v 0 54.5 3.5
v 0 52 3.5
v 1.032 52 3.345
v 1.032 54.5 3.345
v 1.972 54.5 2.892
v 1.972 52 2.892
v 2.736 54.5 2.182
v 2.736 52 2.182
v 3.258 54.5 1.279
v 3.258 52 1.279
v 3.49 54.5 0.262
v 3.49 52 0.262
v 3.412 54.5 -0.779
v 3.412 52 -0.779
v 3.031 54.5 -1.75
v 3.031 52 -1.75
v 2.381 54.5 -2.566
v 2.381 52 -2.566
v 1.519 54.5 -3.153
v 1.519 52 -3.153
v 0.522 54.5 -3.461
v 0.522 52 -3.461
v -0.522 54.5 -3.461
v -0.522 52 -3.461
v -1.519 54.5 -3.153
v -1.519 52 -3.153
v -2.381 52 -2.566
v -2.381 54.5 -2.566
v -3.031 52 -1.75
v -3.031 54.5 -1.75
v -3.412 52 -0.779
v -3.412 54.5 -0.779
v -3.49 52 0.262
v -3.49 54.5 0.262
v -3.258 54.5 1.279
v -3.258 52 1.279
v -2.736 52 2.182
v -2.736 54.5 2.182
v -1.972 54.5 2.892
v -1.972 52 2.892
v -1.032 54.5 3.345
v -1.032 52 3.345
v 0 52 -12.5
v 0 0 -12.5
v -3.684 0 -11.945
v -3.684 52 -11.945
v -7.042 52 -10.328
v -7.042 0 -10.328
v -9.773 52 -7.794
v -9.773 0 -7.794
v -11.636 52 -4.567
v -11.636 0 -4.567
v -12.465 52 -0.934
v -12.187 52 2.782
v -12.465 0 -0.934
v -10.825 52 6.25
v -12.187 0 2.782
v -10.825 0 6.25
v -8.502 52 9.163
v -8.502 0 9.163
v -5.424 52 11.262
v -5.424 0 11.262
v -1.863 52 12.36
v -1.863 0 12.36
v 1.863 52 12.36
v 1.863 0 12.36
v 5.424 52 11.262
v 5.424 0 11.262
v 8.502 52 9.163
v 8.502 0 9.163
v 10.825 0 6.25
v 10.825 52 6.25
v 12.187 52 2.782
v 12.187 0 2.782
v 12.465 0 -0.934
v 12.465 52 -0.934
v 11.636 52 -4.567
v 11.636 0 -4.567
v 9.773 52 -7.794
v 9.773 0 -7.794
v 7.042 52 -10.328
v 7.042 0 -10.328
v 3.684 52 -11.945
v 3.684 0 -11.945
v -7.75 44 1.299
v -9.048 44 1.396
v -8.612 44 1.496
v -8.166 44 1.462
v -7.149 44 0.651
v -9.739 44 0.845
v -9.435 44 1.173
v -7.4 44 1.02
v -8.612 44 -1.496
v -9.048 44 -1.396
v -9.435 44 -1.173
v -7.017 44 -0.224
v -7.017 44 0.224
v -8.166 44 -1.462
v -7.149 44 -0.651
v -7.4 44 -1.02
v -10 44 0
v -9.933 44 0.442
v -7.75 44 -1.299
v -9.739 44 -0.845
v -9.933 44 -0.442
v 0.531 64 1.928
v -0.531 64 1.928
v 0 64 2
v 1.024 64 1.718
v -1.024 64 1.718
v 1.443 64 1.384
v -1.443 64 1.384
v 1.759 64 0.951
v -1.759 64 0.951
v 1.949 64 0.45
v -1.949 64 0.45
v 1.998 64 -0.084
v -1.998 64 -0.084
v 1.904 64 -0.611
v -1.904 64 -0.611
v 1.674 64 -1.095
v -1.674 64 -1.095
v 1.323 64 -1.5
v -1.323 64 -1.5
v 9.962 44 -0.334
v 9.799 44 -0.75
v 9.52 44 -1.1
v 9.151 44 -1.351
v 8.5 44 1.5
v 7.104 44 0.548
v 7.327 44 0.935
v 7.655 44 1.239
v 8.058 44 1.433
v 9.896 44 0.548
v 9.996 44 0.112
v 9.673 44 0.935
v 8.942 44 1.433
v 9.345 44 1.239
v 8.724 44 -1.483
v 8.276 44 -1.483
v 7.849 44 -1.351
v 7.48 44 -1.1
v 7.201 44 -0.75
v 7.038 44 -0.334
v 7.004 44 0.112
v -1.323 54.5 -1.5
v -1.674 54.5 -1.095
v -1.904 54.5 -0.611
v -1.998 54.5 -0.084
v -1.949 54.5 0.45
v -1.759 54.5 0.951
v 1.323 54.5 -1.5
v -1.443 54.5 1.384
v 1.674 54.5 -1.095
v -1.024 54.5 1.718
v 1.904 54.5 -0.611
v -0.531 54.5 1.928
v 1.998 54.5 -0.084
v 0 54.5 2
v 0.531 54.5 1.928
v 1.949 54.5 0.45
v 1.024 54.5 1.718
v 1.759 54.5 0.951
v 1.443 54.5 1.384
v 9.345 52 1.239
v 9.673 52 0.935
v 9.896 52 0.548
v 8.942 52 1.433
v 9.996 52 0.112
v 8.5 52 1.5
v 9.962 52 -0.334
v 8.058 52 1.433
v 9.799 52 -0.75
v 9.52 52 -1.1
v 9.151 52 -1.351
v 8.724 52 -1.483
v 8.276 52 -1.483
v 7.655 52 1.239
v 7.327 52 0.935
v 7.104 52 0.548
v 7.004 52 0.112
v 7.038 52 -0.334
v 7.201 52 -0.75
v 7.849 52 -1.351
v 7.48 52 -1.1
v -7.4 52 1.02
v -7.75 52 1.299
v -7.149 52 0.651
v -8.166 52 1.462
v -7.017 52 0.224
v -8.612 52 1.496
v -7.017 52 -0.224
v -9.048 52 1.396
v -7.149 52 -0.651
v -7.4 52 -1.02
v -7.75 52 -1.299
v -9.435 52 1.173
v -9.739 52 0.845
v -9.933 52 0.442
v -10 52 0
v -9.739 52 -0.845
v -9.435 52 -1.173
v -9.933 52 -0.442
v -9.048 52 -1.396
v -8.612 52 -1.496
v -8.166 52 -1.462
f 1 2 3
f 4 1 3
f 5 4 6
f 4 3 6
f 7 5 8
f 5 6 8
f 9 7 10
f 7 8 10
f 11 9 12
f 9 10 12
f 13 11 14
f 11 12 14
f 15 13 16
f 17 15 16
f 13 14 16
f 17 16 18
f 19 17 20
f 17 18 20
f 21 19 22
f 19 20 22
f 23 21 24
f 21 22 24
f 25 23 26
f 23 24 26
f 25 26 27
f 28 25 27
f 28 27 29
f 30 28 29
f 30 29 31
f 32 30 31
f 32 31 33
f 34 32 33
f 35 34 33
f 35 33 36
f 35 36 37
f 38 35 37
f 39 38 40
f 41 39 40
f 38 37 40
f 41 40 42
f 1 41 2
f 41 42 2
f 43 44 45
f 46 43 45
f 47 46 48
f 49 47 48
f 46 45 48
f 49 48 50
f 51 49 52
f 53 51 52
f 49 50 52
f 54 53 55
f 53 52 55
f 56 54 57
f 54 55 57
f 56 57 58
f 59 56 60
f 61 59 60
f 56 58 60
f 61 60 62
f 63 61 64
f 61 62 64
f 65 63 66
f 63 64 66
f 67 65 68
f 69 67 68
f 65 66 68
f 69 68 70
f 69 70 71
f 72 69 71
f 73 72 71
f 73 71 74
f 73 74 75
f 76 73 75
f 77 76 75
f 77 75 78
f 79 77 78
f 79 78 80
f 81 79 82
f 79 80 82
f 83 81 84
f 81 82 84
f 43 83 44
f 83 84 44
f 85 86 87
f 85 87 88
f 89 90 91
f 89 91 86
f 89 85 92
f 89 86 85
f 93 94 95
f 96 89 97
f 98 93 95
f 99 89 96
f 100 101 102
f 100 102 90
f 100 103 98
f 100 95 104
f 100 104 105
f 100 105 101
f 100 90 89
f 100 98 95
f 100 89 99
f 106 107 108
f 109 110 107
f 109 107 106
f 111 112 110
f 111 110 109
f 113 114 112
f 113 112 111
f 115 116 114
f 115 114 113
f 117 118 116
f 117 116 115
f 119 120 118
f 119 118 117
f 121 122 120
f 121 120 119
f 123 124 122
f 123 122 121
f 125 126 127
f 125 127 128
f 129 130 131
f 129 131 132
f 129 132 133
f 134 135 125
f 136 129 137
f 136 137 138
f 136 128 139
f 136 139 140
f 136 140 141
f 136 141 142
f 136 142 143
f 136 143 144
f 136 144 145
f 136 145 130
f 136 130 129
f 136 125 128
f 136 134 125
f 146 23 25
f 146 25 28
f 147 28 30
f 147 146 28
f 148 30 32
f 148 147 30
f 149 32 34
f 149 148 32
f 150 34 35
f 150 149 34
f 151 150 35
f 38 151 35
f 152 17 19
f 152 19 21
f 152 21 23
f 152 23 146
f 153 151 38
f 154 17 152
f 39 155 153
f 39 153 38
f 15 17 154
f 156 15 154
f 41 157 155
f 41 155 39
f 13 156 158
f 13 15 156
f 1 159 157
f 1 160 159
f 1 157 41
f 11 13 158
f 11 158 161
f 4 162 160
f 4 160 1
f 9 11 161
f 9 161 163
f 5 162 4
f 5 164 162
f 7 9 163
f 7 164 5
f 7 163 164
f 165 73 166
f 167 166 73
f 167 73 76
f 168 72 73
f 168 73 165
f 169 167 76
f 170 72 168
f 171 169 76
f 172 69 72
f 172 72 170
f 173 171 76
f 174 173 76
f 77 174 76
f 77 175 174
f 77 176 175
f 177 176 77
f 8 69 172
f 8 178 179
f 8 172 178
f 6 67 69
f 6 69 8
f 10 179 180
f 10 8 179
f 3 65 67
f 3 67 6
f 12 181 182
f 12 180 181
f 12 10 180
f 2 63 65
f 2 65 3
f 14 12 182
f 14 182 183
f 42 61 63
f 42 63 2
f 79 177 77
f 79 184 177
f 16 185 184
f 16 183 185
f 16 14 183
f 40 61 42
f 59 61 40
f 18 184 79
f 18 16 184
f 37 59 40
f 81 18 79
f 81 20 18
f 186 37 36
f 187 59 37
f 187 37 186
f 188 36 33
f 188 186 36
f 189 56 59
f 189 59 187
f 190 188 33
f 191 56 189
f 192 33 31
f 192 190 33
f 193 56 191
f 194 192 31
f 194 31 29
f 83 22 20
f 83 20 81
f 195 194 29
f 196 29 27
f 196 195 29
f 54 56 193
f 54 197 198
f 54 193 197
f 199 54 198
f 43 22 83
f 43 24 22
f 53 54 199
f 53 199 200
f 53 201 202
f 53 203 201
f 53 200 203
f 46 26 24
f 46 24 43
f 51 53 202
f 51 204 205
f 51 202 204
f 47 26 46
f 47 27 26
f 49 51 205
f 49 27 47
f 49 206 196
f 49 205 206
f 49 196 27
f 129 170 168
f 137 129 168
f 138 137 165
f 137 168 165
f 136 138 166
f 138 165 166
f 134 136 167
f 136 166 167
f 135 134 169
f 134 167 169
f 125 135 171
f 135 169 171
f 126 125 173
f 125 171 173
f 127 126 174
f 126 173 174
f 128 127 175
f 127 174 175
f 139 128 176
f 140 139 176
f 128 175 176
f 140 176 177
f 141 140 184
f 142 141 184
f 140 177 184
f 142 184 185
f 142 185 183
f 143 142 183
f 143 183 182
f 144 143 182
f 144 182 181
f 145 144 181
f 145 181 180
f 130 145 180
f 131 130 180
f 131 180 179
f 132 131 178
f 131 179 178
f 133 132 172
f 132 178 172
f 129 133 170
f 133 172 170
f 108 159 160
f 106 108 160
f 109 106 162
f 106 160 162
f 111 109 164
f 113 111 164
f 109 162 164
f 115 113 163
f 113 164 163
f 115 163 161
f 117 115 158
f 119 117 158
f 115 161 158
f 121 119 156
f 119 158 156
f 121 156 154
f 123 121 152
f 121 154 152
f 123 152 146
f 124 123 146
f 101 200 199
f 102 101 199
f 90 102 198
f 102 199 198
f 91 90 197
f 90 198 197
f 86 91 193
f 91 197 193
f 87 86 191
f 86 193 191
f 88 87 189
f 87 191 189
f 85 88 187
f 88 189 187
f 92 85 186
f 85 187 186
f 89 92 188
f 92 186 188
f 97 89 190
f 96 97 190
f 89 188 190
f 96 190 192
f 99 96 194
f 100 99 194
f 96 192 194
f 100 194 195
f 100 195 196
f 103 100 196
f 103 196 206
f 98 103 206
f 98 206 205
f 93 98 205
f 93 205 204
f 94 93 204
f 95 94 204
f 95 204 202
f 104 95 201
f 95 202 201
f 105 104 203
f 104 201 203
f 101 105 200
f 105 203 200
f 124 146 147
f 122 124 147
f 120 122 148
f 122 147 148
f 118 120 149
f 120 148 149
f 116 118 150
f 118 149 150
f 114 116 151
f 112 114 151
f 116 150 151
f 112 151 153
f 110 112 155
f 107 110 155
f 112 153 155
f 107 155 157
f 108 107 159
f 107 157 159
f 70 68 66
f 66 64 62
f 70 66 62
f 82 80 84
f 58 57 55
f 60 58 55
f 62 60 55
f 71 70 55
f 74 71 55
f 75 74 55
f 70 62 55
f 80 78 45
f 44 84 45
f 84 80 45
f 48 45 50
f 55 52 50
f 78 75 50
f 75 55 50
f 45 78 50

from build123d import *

# Parameters (mm, degrees)
SKETCH1_R           = 12.5
BOSS_EXTRUDE1_DEPTH = 52
SKETCH2_R           = 3.5
BOSS_EXTRUDE2_DEPTH = 2.5
BOSS_EXTRUDE3_DEPTH = 9.5
SKETCH4_R           = 1.5
CUT_EXTRUDE1_DEPTH  = 8


with BuildPart() as part:
    # Sketch1 → Boss-Extrude1 (new body)
    with BuildSketch(Plane(origin=(0, 0, 0), x_dir=(1, 0, 0), z_dir=(0, 1, 0))):
        with Locations(Location((0, 0, 0), (0, 0, 90))):
            Circle(SKETCH1_R)
    extrude(amount=BOSS_EXTRUDE1_DEPTH)

    # Sketch2 → Boss-Extrude2 (add)
    with BuildSketch(Plane(origin=(0, 52, 0), x_dir=(1, 0, 0), z_dir=(0, 1, 0))):
        with Locations(Location((0, 0, 0), (0, 0, 270))):
            Circle(SKETCH2_R)
    extrude(amount=BOSS_EXTRUDE2_DEPTH)

    # Sketch3 → Boss-Extrude3 (add)
    with BuildSketch(Plane(origin=(0, 54.5, 0), x_dir=(1, 0, 0), z_dir=(0, 1, 0))):
        with BuildLine():
            ThreePointArc((-1.322875656, 1.5), (-1.870828693, -0.707106781), (0, -2))
            Line((0, -2), (0, 1.5))
            Line((0, 1.5), (-1.322875656, 1.5))
        make_face()
        with BuildLine():
            Line((0, 1.5), (0, -2))
            ThreePointArc((0, -2), (1.870828693, -0.707106781), (1.322875656, 1.5))
            Line((1.322875656, 1.5), (0, 1.5))
        make_face()
    extrude(amount=BOSS_EXTRUDE3_DEPTH)

    # Sketch4 → Cut-Extrude1 (cut)
    with BuildSketch(Plane(origin=(0, 52, 0), x_dir=(1, 0, 0), z_dir=(0, 1, 0))):
        with BuildLine():
            ThreePointArc((-7, 0), (-8.5, 1.5), (-10, 0))
            Line((-10, 0), (-7, 0))
        make_face()
        with BuildLine():
            Line((-7, 0), (-10, 0))
            ThreePointArc((-10, 0), (-8.5, -1.5), (-7, 0))
        make_face()
        with Locations(Location((8.5, 0, 0), (0, 0, 270))):
            Circle(SKETCH4_R)
    extrude(amount=-CUT_EXTRUDE1_DEPTH, mode=Mode.SUBTRACT)


solid = part.part
